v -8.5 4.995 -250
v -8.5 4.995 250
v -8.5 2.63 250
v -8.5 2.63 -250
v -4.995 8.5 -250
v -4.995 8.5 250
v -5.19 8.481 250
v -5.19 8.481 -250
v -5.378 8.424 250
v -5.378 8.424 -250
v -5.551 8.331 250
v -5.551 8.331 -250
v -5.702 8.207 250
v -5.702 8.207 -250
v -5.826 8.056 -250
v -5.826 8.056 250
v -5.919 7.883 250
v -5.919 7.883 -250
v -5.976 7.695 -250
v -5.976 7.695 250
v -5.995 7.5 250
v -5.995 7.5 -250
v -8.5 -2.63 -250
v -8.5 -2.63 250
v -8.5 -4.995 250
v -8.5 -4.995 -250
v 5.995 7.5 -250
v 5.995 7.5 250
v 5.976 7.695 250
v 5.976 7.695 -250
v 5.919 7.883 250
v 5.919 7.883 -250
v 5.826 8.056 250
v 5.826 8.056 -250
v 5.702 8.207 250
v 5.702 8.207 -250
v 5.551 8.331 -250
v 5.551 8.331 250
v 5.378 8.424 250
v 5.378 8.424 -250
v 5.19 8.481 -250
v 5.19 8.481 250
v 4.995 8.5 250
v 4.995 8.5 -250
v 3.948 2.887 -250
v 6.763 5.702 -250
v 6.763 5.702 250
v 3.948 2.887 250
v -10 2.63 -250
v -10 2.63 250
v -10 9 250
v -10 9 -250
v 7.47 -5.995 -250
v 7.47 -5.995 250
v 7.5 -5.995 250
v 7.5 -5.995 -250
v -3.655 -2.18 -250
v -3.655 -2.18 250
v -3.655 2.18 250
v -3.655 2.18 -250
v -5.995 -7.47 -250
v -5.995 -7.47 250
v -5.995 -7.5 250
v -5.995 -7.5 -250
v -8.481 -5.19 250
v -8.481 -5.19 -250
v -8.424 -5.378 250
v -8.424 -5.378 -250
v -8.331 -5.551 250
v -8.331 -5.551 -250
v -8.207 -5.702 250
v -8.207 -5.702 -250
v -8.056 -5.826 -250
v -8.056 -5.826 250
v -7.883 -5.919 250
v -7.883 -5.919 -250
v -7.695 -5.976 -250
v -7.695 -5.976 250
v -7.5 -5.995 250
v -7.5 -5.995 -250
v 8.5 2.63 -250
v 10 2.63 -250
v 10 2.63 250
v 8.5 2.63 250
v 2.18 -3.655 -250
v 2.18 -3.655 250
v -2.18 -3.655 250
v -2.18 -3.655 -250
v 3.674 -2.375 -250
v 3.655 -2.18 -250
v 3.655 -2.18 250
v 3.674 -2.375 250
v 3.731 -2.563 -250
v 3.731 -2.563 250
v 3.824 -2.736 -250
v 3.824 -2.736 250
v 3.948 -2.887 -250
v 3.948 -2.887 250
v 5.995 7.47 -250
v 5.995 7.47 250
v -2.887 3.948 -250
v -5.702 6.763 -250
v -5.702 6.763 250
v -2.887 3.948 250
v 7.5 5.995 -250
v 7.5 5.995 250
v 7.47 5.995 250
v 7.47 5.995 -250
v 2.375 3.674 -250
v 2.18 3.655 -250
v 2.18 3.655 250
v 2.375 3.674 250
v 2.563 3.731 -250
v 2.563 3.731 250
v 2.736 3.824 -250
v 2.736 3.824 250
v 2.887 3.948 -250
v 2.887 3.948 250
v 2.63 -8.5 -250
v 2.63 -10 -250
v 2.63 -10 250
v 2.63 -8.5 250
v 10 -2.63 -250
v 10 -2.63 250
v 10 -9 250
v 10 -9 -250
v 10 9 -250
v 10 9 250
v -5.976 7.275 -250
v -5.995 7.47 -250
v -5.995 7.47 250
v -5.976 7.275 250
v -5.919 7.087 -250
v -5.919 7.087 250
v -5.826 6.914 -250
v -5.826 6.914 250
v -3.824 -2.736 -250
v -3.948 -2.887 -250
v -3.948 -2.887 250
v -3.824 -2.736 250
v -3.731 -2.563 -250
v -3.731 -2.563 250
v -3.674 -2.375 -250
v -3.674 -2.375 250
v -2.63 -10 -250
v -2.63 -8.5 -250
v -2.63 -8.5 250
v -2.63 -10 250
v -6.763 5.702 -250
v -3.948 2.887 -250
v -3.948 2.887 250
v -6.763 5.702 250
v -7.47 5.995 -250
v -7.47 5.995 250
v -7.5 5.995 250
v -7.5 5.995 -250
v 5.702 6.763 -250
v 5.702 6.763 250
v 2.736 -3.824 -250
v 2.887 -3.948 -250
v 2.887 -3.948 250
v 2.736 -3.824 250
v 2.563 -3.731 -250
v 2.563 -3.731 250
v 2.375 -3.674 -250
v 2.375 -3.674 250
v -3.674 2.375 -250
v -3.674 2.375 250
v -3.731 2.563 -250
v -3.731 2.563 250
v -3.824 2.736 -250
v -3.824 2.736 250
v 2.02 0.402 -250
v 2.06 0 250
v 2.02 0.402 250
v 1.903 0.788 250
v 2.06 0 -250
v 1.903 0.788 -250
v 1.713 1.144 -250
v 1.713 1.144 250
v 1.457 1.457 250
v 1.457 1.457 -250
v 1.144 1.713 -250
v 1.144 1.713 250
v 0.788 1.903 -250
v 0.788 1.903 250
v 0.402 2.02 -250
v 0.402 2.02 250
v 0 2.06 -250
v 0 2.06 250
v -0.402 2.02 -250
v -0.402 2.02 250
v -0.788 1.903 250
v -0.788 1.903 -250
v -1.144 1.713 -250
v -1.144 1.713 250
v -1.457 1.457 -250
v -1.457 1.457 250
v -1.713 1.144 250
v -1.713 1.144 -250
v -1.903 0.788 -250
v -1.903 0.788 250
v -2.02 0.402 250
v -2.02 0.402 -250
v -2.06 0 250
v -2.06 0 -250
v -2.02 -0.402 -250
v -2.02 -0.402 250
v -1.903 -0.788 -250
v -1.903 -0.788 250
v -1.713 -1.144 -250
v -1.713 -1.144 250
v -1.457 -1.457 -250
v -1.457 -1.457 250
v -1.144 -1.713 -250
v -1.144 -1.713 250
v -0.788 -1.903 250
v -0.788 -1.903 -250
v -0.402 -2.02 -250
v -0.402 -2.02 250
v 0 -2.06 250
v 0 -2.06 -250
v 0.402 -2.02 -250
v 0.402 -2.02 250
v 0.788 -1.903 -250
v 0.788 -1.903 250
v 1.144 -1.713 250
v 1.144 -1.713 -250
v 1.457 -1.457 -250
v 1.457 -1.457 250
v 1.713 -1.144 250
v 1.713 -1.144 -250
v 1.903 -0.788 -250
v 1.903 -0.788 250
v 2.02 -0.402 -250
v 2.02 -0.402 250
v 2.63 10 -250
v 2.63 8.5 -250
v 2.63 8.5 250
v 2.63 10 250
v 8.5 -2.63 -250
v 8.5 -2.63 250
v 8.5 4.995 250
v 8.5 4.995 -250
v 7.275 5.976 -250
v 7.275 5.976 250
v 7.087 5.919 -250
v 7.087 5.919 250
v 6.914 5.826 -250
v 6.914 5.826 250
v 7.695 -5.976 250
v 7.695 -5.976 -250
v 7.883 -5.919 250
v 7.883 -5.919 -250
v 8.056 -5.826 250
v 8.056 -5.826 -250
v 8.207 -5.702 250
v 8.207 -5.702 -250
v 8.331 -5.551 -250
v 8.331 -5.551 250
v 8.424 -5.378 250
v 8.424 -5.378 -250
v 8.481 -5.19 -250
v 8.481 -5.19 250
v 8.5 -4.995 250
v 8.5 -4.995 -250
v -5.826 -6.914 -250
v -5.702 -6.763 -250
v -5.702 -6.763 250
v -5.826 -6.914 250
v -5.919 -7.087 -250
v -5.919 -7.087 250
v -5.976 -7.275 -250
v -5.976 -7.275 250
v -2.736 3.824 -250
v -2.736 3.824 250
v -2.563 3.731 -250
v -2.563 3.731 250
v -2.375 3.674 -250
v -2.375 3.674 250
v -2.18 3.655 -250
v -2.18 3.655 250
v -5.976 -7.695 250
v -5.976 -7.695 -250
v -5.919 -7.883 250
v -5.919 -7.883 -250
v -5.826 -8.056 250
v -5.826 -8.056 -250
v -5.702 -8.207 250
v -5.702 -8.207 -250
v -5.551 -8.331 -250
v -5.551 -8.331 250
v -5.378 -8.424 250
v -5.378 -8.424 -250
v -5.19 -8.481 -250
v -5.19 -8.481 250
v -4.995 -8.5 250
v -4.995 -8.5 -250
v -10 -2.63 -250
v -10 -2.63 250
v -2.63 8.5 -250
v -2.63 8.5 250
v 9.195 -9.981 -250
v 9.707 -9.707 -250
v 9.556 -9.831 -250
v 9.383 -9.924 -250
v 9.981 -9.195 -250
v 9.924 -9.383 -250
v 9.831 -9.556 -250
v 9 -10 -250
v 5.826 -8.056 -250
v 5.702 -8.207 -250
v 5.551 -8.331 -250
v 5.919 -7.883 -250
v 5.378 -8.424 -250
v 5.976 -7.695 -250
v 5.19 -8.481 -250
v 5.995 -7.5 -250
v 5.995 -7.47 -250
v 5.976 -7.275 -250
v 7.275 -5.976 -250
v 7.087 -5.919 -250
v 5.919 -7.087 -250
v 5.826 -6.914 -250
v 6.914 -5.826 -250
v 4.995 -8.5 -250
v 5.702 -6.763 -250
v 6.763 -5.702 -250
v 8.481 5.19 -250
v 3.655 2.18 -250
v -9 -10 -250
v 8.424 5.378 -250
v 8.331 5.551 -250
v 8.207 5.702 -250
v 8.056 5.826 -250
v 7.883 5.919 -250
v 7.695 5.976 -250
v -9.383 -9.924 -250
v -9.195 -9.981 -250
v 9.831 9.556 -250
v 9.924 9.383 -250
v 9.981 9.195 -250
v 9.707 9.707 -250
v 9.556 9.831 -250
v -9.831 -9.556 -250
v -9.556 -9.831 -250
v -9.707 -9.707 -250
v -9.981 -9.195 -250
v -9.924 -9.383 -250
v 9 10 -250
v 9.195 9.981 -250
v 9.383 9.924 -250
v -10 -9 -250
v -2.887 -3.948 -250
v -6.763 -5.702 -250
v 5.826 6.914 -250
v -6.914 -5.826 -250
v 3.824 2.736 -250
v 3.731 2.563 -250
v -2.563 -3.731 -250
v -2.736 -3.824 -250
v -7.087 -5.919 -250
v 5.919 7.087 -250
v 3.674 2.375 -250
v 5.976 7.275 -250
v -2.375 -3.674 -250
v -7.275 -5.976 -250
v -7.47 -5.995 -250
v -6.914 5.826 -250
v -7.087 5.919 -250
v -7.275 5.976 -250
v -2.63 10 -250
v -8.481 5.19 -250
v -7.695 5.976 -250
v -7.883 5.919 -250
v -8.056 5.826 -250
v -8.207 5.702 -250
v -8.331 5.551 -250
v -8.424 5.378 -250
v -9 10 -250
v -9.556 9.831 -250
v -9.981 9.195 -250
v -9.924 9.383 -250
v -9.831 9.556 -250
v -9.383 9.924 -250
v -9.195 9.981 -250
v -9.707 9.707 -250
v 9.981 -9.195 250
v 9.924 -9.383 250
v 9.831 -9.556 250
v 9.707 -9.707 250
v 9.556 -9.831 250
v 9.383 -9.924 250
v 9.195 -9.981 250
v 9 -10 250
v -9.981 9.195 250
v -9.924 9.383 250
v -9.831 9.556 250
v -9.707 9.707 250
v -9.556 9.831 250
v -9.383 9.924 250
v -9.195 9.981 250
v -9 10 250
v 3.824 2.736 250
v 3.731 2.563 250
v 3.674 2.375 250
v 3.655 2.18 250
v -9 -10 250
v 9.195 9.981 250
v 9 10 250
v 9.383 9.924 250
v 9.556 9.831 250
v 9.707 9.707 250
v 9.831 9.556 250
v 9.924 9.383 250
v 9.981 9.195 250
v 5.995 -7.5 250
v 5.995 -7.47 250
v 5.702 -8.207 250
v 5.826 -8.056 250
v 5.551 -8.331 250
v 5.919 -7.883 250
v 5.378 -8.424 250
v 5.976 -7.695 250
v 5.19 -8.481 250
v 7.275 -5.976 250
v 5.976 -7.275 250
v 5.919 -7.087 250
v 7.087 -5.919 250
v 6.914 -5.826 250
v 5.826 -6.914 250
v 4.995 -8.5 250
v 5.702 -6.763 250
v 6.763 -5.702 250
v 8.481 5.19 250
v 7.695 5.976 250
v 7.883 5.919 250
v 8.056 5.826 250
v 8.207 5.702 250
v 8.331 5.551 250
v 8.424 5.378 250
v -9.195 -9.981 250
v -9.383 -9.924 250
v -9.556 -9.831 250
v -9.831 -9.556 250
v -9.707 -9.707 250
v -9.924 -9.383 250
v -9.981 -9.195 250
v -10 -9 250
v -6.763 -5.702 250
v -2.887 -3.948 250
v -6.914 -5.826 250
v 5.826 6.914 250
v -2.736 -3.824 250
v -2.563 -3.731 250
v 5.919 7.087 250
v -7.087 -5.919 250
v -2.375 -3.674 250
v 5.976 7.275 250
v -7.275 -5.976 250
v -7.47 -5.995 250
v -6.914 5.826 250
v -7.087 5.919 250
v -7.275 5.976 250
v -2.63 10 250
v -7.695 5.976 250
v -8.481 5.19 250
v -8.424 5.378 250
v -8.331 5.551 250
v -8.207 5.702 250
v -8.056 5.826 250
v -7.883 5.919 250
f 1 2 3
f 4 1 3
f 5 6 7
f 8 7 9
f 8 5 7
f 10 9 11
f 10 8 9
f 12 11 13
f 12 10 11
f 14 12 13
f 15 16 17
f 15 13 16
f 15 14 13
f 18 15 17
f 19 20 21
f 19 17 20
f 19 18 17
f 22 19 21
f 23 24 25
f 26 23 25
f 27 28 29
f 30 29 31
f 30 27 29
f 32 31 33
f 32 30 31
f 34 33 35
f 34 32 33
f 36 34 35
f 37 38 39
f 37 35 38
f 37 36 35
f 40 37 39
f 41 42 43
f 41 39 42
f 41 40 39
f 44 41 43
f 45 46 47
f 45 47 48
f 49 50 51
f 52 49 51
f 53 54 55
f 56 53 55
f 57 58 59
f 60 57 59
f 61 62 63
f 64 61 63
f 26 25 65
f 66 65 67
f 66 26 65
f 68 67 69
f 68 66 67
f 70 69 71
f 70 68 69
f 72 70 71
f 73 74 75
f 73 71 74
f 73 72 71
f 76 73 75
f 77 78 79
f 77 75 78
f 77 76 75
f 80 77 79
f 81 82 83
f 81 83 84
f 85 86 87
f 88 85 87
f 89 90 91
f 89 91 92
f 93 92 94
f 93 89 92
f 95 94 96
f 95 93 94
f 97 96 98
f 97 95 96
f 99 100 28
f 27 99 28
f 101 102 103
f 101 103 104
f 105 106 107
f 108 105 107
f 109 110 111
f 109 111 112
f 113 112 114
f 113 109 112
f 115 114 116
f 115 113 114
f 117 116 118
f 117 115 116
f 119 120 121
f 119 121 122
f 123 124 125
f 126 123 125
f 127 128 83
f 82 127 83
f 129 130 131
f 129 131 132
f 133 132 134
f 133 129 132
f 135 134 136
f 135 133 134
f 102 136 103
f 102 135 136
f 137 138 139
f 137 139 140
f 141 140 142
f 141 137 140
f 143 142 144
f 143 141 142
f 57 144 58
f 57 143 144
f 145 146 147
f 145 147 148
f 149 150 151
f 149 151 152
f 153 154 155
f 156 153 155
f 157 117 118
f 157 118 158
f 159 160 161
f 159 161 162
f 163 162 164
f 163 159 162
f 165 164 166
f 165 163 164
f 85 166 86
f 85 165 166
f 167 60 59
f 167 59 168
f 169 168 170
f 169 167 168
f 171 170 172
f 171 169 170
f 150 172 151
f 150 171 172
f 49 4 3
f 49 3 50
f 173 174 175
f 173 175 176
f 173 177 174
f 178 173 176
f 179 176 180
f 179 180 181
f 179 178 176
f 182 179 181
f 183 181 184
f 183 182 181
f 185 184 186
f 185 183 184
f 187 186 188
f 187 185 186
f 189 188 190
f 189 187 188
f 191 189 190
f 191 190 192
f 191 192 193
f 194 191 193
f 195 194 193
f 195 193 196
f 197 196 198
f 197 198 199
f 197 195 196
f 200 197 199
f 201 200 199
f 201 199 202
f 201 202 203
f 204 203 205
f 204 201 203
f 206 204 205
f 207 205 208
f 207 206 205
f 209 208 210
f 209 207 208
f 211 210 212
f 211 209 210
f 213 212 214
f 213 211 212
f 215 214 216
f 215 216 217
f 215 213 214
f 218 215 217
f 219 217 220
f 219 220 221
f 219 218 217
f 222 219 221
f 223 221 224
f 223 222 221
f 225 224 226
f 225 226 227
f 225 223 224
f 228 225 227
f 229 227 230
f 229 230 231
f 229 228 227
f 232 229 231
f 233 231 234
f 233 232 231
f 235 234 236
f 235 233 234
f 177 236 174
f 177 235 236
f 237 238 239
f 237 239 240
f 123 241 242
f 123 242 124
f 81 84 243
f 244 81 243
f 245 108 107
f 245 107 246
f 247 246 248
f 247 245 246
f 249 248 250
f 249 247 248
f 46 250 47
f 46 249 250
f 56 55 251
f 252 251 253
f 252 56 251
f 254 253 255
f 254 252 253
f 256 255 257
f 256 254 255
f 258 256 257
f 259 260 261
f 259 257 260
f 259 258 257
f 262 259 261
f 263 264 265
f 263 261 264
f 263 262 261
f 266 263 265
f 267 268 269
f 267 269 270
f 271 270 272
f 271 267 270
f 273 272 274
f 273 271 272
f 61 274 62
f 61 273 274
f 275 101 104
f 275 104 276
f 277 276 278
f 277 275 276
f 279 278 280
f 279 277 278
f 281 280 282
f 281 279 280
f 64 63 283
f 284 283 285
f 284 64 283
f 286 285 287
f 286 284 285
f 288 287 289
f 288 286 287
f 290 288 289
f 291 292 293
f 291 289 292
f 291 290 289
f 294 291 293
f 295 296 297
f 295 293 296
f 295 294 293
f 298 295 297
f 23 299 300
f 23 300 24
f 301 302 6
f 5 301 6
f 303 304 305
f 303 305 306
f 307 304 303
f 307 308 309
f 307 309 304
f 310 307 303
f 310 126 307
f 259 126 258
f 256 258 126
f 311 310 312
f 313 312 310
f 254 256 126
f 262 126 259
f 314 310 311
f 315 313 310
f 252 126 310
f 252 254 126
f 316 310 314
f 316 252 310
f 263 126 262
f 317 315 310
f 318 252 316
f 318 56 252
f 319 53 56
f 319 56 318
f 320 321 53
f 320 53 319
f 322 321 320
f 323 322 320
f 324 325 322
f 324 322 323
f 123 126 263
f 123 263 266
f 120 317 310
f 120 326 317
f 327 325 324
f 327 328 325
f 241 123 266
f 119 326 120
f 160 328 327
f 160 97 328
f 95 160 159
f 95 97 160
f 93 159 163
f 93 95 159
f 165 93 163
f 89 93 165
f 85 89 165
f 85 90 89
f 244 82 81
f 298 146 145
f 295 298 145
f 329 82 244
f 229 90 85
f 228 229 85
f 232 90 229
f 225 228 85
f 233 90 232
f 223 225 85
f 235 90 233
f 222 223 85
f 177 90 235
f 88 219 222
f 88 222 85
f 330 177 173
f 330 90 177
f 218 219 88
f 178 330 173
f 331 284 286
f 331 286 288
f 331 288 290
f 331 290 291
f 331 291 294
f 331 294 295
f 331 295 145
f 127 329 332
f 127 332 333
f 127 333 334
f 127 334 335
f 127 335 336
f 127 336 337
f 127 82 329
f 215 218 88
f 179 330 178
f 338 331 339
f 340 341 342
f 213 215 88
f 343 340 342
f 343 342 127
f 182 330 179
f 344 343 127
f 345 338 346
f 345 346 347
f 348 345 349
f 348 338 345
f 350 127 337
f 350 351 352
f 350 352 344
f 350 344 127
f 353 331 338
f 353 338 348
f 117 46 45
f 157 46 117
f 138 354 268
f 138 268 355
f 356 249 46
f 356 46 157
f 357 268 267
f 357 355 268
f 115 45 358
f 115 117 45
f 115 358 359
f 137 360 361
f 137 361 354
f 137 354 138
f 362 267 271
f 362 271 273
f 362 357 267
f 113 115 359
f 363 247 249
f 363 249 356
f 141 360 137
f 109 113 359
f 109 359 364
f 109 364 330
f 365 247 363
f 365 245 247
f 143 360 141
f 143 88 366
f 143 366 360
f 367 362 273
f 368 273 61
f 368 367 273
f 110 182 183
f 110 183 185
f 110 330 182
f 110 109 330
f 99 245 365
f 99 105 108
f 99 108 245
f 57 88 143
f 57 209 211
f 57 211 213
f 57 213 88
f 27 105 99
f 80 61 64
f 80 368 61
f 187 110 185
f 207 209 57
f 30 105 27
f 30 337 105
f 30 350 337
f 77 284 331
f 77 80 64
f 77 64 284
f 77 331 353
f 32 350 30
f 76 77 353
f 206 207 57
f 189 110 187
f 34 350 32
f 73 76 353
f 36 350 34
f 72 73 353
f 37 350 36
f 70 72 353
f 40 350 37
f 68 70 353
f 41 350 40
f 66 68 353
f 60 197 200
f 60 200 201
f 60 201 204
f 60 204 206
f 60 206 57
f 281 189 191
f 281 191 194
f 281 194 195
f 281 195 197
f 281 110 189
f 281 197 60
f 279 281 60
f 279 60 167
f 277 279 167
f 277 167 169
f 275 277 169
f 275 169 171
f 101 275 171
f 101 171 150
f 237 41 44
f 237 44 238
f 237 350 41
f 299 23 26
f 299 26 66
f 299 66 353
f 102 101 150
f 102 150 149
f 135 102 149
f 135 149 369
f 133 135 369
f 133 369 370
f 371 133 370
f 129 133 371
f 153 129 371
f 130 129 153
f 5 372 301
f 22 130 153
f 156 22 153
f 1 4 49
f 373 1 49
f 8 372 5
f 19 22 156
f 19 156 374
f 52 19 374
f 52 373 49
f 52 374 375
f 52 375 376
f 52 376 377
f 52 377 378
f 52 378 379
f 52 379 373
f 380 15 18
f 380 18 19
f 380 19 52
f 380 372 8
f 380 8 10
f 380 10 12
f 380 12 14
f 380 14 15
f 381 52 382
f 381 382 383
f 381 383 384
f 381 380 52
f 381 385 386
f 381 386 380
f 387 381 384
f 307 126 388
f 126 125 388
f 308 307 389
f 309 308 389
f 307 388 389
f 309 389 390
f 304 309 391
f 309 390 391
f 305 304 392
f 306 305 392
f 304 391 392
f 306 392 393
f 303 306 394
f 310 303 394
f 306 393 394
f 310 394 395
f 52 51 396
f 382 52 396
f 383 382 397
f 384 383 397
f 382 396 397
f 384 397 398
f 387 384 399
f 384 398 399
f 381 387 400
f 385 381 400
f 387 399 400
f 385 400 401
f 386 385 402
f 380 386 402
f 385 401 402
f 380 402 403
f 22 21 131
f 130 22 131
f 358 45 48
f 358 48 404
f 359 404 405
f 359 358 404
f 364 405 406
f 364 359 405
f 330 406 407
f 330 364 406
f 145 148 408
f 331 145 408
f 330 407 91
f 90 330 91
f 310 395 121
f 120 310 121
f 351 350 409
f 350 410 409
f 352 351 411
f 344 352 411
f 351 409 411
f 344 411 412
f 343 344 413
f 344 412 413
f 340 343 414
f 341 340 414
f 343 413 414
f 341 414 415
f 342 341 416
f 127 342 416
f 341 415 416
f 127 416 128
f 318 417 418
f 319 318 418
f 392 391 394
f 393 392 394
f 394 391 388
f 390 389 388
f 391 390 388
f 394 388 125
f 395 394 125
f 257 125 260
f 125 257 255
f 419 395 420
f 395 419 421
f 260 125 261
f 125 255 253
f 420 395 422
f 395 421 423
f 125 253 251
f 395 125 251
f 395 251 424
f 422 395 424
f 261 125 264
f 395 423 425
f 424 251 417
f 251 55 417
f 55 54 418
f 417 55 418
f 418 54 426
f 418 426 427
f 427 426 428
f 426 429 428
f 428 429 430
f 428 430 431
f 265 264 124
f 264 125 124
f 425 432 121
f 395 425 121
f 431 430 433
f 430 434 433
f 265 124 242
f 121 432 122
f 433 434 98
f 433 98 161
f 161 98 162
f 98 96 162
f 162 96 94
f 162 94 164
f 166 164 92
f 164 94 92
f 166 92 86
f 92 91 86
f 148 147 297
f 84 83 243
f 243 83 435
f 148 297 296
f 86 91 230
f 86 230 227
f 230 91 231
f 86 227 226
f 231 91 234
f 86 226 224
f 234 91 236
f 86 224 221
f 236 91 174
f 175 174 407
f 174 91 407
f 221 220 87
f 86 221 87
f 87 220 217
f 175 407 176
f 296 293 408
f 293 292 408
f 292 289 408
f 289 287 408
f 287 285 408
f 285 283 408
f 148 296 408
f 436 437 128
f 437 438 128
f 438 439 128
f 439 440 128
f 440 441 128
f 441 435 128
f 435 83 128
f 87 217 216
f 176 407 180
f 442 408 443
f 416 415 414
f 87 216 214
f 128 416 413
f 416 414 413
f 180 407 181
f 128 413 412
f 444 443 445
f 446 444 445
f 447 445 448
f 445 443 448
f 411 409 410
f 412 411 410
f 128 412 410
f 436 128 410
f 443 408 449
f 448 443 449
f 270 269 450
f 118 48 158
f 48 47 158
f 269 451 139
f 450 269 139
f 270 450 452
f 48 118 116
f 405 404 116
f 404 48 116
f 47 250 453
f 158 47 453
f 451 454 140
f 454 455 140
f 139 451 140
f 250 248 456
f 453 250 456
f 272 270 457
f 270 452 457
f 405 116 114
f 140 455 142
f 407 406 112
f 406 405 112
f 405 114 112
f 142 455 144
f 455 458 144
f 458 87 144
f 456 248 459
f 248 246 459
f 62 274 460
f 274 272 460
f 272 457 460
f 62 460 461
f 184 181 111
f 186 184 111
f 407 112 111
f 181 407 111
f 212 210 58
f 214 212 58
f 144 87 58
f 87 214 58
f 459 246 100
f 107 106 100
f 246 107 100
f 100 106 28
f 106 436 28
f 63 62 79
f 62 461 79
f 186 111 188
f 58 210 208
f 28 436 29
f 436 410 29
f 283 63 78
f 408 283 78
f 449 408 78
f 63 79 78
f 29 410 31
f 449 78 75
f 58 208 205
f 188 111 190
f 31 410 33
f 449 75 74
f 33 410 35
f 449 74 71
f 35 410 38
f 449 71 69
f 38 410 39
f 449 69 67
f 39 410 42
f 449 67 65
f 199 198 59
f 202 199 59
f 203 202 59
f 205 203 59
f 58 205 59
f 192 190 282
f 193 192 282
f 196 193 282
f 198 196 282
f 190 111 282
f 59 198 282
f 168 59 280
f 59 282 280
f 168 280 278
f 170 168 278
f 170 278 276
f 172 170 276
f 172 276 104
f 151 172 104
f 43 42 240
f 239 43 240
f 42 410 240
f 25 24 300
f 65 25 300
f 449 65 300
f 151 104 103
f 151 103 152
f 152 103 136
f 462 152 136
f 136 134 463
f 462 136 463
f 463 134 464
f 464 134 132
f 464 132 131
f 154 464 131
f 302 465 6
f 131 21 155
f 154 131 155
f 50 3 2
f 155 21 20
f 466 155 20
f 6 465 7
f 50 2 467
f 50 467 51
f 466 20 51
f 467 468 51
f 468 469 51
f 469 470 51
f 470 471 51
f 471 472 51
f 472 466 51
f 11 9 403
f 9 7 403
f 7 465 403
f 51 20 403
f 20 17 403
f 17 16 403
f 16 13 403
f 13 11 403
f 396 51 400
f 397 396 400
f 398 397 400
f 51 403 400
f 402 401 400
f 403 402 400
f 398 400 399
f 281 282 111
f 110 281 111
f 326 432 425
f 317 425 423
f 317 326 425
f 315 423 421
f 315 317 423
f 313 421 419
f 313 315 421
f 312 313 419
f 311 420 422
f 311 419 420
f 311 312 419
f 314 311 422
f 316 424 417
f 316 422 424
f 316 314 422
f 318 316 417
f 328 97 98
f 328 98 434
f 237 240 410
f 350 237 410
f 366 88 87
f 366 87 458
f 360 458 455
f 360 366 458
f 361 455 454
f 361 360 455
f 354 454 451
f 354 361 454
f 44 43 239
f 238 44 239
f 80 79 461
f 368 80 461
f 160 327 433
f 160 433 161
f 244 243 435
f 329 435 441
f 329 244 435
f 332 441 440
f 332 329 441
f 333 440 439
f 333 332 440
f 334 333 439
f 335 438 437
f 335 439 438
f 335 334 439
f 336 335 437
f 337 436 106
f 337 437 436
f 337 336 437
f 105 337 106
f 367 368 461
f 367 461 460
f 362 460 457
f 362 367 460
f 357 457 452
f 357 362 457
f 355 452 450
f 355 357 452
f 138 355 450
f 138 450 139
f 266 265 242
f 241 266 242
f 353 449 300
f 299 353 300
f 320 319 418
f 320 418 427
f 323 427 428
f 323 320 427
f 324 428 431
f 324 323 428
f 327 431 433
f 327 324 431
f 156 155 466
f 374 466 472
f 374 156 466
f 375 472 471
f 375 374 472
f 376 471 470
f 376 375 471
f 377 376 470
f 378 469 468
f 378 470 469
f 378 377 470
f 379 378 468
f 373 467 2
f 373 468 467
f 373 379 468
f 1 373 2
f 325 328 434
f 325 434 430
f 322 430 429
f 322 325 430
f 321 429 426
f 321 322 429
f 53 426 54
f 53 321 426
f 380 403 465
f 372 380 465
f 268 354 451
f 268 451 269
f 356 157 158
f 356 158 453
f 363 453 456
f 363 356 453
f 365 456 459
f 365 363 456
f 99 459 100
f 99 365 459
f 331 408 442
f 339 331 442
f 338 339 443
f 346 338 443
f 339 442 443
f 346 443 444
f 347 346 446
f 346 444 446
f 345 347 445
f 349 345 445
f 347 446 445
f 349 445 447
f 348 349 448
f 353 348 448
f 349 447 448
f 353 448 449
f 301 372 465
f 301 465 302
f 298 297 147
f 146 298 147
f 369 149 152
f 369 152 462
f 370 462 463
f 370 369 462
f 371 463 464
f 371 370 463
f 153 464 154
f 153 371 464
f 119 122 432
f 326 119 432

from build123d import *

# Parameters (mm, degrees)
SKETCH1_R           = 2.06
BOSS_EXTRUDE1_DEPTH = 250
CUT_EXTRUDE1_DEPTH  = 501
CIRPATTERN1_COUNT   = 4


with BuildPart() as part:
    # Sketch1 → Boss-Extrude1 (new body, symmetric)
    with BuildSketch(Plane.XY):
        with BuildLine():
            Line((-9, 10), (9, 10))
            ThreePointArc((9, 10), (9.707106781, 9.707106781), (10, 9))
            Line((10, 9), (10, -9))
            ThreePointArc((10, -9), (9.707106781, -9.707106781), (9, -10))
            Line((9, -10), (-9, -10))
            ThreePointArc((-9, -10), (-9.707106781, -9.707106781), (-10, -9))
            Line((-10, -9), (-10, 9))
            ThreePointArc((-10, 9), (-9.707106781, 9.707106781), (-9, 10))
        make_face()
        Circle(SKETCH1_R, mode=Mode.SUBTRACT)
    extrude(amount=BOSS_EXTRUDE1_DEPTH, both=True)

    # Sketch2 → Cut-Extrude1 (cut, through all)
    with BuildSketch(Plane(origin=(0, 0, -250), x_dir=(-1, 0, 0), z_dir=(0, 0, -1))):
        with BuildLine():
            Line((-10, 2.63), (-8.5, 2.63))
            Line((-8.5, 2.63), (-8.5, 4.995))
            ThreePointArc((-8.5, 4.995), (-8.207106781, 5.702106781), (-7.5, 5.995))
            Line((-7.5, 5.995), (-7.469873734, 5.995))
            ThreePointArc((-7.469873734, 5.995), (-7.087190302, 5.918879533), (-6.762766953, 5.702106781))
            Line((-6.762766953, 5.702106781), (-3.947893219, 2.887233047))
            ThreePointArc((-3.947893219, 2.887233047), (-3.731120467, 2.562809698), (-3.655, 2.180126266))
            Line((-3.655, 2.180126266), (-3.655, -2.180126266))
            ThreePointArc((-3.655, -2.180126266), (-3.731120467, -2.562809698), (-3.947893219, -2.887233047))
            Line((-3.947893219, -2.887233047), (-6.762766953, -5.702106781))
            ThreePointArc((-6.762766953, -5.702106781), (-7.087190302, -5.918879533), (-7.469873734, -5.995))
            Line((-7.469873734, -5.995), (-7.5, -5.995))
            ThreePointArc((-7.5, -5.995), (-8.207106781, -5.702106781), (-8.5, -4.995))
            Line((-8.5, -4.995), (-8.5, -2.63))
            Line((-8.5, -2.63), (-10, -2.63))
            Line((-10, -2.63), (-10, 2.63))
        make_face()
    cut_extrude1 = extrude(amount=-CUT_EXTRUDE1_DEPTH, mode=Mode.SUBTRACT)

    # CirPattern1: Cut-Extrude1 ×4 about axis
    cirpattern1_axis = Axis((0, 0, 0), (0, 0, 1))
    for i in range(1, CIRPATTERN1_COUNT):
        add(cut_extrude1.rotate(cirpattern1_axis, i * 360 / CIRPATTERN1_COUNT), mode=Mode.SUBTRACT)


solid = part.part
